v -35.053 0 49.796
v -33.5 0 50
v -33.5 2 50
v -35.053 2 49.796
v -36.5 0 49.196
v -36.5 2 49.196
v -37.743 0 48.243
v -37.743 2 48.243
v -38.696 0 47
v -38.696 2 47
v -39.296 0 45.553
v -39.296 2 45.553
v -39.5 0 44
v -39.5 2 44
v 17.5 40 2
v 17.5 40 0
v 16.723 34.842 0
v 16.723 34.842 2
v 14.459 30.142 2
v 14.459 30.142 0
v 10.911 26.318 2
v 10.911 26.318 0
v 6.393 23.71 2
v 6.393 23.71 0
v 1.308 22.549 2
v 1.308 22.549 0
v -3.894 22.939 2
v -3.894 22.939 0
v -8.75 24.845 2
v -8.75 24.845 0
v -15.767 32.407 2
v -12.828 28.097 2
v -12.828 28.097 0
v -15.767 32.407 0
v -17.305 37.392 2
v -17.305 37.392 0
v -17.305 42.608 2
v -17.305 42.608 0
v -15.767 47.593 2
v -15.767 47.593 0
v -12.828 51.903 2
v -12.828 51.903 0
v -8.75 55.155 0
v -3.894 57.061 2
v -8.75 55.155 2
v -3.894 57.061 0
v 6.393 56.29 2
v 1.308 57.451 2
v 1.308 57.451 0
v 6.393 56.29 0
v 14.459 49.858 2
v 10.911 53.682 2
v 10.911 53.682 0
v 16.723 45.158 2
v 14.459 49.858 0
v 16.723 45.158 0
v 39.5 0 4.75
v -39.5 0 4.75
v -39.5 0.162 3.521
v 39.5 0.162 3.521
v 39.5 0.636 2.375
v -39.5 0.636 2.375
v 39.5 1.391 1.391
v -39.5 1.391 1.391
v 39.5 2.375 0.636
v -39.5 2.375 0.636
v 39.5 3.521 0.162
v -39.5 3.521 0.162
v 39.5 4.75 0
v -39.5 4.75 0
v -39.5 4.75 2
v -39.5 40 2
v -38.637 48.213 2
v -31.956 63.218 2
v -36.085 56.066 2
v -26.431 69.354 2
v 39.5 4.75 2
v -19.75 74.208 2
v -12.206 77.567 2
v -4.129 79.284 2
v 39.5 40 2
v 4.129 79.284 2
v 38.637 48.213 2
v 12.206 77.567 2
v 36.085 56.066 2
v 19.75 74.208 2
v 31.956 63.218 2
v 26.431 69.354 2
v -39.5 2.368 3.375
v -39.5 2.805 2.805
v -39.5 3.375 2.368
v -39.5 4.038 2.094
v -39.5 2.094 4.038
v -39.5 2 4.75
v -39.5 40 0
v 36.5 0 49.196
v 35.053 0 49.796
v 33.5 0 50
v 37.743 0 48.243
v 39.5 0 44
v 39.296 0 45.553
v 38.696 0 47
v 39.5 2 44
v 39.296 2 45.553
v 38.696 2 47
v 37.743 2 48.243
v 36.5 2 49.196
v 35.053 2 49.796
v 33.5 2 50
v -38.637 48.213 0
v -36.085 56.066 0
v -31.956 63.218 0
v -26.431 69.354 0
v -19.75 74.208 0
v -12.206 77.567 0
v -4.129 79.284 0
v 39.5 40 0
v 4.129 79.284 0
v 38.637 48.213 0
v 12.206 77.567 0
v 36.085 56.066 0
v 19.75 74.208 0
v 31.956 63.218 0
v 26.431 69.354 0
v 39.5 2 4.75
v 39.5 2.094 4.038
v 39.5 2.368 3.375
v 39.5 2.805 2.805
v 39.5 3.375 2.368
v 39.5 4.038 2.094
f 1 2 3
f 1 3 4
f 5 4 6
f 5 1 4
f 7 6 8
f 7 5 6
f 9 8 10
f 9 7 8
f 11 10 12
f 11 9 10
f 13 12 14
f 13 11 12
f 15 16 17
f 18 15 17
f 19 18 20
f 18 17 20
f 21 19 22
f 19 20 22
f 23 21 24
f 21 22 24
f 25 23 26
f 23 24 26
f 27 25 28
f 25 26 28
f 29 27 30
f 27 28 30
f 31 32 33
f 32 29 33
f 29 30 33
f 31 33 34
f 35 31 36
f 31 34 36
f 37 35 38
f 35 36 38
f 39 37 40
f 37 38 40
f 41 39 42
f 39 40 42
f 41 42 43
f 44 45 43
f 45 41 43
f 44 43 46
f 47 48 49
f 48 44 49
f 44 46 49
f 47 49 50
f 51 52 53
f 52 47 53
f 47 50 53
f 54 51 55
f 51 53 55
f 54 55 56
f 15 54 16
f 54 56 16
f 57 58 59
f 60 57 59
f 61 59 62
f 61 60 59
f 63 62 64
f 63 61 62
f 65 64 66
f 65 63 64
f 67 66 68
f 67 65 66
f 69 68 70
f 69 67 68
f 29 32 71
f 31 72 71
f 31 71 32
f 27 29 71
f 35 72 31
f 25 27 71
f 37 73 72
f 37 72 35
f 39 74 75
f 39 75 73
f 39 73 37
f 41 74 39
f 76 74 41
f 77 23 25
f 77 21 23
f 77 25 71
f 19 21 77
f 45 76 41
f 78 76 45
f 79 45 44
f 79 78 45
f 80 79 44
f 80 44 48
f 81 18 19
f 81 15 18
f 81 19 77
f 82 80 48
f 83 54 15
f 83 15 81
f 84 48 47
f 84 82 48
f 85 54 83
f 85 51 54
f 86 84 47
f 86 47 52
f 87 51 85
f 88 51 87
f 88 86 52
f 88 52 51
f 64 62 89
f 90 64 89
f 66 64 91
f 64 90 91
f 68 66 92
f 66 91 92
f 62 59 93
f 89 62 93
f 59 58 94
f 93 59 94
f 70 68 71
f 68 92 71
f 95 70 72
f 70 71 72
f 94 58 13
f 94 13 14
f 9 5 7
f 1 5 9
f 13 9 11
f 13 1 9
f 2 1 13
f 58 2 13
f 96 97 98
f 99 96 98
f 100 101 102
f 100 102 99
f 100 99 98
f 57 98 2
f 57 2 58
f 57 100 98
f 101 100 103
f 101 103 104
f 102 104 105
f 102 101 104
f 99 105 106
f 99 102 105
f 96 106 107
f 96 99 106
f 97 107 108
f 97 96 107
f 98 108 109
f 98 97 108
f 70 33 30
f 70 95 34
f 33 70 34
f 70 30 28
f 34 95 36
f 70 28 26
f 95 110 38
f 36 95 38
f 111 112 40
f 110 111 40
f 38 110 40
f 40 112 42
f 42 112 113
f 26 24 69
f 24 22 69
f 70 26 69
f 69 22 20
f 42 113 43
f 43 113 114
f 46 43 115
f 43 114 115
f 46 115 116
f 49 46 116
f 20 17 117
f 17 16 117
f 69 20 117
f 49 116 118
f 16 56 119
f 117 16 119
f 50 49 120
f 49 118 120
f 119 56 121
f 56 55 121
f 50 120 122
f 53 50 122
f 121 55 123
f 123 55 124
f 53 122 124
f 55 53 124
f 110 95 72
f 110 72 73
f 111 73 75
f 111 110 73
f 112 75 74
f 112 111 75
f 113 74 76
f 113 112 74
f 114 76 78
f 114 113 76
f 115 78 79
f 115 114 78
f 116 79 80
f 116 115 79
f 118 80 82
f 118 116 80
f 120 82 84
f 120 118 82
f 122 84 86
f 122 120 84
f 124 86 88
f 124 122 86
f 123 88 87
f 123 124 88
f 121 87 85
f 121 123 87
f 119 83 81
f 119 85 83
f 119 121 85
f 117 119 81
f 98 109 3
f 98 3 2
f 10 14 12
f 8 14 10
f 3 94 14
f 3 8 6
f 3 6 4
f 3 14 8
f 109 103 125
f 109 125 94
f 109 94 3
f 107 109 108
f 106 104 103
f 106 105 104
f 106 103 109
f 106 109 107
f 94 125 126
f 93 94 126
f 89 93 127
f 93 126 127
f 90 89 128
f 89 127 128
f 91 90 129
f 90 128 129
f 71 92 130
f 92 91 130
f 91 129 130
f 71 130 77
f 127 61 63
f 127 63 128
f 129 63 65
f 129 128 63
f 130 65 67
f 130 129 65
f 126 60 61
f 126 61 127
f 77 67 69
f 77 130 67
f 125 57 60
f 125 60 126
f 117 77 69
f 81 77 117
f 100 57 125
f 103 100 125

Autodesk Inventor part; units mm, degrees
ref_plane "YZ Plane" through (0, 0, 0) normal (1, 0, 0) x (0, 1, 0)
ref_plane "XZ Plane" through (0, 0, 0) normal (0, 1, 0) x (-1, 0, 0)
ref_plane "XY Plane" through (0, 0, 0) normal (0, 0, 1) x (1, 0, 0)
sketch "Sketch1" plane through (0, 0, 0) normal (0, 0, 1) x (1, 0, 0)
  line L0 (-39.5, 0) -> (39.5, 0)
  line L1 (-39.5, 0) -> (-39.5, 40)
  arc A0 (39.5, 40) -> (-39.5, 40) centre (0, 40) ccw
  line L2 (39.5, 40) -> (39.5, 0)
  circle A1 centre (0, 40) radius 17.5
  point P0 (0, 0)
  point P1 (0, 0)
  dimension "d6" = 35
  dimension "d7" = 22
  dimension "d8" = 40
extrude "Plate1" add sketch "Sketch1" along normal blind 2
sketch "Sketch3" plane through (39.5, 2, 0) normal (0, -1, 0) x (1, 0, 0)
  line L0 (-79, 0) -> (0, 0)
  line L1 (0, 0) -> (0, 50)
  line L2 (0, 50) -> (-79, 50)
  line L3 (-79, 50) -> (-79, 0)
edge flange "Flange1" height 50 angle 90 thickness 2 bend radius 2.75 thickness toward (0, -1, 0) relief round relief width 2 relief depth 1 edges at (0, 0, 2) wall of the first edge with corners at (-39.5, 2, 0) (39.5, 2, 0) (39.5, 2, 50) (-39.5, 2, 50)
bend "Bend1"
corner "Corner1"
fillet "Corner Round1" radius 6 2 edges at (39.5, 1, 50) (-39.5, 1, 50)
equation "\"d2\" = Thickness"
equation "\"d9\" = BendReliefWidth"
equation "\"d10\" = BendReliefDepth"
equation "\"d11\" = MinimumRemnant"
equation "\"d12\" = TransitionRadius"
equation "\"d15\" = BendRadius"
equation "\"d16\" = CornerReliefSize"
equation "\"d17\" = GapSize"
equation "\"d18\" = JacobiRadiusSize"
equation "\"BendReliefWidth\" = Thickness"
equation "\"BendReliefDepth\" = 0.5 * Thickness"
equation "\"CornerReliefSize\" = 4 * Thickness"
equation "\"MinimumRemnant\" = 2 * Thickness"
equation "\"TransitionRadius\" = BendRadius"
equation "\"JacobiRadiusSize\" = BendRadius"
equation "\"GapSize\" = Thickness"
equation "\"Thickness\" = 2"
equation "\"BendRadius\" = 2.75"
properties part number "D-ring 11" material "Stainless Steel"
